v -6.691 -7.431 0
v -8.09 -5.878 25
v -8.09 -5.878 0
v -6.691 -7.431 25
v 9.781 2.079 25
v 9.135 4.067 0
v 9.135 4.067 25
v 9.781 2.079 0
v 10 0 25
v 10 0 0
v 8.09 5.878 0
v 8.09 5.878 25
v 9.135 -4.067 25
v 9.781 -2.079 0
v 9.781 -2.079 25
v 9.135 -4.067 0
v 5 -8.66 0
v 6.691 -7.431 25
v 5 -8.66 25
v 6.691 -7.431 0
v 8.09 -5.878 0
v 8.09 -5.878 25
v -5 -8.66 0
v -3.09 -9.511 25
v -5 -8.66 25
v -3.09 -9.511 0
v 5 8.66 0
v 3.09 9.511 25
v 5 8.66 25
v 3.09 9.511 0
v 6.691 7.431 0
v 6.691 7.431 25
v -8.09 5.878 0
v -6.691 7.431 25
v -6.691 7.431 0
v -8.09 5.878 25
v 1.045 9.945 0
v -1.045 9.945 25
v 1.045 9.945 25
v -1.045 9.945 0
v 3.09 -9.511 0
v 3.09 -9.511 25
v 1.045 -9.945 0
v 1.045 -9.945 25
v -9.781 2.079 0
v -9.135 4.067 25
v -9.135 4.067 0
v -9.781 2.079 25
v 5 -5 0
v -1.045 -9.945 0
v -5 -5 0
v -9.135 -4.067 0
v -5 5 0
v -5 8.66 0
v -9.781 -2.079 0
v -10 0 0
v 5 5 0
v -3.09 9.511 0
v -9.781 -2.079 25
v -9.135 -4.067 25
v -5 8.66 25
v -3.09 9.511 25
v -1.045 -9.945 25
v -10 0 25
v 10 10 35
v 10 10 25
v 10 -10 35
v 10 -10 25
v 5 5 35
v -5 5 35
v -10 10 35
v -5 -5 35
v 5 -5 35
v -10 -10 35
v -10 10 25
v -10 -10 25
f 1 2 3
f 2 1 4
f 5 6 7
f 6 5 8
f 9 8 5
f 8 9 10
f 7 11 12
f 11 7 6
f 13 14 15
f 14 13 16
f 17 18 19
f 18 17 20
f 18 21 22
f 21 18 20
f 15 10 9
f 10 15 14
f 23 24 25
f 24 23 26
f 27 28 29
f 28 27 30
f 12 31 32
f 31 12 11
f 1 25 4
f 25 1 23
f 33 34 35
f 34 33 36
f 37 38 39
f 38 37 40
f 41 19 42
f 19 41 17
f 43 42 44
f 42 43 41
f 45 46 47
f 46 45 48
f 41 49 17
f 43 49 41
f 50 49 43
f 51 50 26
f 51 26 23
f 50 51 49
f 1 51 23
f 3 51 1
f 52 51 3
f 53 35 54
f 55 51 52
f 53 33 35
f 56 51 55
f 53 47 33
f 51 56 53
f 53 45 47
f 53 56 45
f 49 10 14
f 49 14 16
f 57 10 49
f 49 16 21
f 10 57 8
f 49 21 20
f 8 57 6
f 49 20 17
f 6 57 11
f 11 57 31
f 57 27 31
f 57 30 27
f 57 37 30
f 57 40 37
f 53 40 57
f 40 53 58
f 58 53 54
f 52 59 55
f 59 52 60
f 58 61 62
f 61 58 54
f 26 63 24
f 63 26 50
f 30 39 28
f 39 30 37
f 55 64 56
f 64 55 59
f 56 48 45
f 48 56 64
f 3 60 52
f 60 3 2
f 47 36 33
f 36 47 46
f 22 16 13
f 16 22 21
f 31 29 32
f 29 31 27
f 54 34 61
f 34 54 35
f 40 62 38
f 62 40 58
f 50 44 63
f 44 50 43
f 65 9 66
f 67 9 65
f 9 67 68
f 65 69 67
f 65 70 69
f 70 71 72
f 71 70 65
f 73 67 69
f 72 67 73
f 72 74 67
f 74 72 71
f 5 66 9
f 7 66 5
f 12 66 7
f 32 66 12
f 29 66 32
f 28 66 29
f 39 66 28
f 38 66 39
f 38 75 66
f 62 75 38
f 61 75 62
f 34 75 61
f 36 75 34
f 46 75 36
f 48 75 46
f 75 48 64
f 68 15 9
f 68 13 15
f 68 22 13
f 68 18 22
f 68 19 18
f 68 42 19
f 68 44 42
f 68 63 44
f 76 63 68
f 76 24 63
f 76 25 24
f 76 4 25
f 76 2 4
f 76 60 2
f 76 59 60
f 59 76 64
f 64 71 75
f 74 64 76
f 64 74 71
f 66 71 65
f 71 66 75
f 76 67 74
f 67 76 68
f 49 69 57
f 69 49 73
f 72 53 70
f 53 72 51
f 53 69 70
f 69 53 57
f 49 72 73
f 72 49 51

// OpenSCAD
difference() {
    union() {
        cylinder(h = 30, r = 10);
        translate([0, 0, 30]) cube([20, 20, 10], center = true);
    }
    translate([-5, -5, -5]) cube([10, 10, 40]);
}
